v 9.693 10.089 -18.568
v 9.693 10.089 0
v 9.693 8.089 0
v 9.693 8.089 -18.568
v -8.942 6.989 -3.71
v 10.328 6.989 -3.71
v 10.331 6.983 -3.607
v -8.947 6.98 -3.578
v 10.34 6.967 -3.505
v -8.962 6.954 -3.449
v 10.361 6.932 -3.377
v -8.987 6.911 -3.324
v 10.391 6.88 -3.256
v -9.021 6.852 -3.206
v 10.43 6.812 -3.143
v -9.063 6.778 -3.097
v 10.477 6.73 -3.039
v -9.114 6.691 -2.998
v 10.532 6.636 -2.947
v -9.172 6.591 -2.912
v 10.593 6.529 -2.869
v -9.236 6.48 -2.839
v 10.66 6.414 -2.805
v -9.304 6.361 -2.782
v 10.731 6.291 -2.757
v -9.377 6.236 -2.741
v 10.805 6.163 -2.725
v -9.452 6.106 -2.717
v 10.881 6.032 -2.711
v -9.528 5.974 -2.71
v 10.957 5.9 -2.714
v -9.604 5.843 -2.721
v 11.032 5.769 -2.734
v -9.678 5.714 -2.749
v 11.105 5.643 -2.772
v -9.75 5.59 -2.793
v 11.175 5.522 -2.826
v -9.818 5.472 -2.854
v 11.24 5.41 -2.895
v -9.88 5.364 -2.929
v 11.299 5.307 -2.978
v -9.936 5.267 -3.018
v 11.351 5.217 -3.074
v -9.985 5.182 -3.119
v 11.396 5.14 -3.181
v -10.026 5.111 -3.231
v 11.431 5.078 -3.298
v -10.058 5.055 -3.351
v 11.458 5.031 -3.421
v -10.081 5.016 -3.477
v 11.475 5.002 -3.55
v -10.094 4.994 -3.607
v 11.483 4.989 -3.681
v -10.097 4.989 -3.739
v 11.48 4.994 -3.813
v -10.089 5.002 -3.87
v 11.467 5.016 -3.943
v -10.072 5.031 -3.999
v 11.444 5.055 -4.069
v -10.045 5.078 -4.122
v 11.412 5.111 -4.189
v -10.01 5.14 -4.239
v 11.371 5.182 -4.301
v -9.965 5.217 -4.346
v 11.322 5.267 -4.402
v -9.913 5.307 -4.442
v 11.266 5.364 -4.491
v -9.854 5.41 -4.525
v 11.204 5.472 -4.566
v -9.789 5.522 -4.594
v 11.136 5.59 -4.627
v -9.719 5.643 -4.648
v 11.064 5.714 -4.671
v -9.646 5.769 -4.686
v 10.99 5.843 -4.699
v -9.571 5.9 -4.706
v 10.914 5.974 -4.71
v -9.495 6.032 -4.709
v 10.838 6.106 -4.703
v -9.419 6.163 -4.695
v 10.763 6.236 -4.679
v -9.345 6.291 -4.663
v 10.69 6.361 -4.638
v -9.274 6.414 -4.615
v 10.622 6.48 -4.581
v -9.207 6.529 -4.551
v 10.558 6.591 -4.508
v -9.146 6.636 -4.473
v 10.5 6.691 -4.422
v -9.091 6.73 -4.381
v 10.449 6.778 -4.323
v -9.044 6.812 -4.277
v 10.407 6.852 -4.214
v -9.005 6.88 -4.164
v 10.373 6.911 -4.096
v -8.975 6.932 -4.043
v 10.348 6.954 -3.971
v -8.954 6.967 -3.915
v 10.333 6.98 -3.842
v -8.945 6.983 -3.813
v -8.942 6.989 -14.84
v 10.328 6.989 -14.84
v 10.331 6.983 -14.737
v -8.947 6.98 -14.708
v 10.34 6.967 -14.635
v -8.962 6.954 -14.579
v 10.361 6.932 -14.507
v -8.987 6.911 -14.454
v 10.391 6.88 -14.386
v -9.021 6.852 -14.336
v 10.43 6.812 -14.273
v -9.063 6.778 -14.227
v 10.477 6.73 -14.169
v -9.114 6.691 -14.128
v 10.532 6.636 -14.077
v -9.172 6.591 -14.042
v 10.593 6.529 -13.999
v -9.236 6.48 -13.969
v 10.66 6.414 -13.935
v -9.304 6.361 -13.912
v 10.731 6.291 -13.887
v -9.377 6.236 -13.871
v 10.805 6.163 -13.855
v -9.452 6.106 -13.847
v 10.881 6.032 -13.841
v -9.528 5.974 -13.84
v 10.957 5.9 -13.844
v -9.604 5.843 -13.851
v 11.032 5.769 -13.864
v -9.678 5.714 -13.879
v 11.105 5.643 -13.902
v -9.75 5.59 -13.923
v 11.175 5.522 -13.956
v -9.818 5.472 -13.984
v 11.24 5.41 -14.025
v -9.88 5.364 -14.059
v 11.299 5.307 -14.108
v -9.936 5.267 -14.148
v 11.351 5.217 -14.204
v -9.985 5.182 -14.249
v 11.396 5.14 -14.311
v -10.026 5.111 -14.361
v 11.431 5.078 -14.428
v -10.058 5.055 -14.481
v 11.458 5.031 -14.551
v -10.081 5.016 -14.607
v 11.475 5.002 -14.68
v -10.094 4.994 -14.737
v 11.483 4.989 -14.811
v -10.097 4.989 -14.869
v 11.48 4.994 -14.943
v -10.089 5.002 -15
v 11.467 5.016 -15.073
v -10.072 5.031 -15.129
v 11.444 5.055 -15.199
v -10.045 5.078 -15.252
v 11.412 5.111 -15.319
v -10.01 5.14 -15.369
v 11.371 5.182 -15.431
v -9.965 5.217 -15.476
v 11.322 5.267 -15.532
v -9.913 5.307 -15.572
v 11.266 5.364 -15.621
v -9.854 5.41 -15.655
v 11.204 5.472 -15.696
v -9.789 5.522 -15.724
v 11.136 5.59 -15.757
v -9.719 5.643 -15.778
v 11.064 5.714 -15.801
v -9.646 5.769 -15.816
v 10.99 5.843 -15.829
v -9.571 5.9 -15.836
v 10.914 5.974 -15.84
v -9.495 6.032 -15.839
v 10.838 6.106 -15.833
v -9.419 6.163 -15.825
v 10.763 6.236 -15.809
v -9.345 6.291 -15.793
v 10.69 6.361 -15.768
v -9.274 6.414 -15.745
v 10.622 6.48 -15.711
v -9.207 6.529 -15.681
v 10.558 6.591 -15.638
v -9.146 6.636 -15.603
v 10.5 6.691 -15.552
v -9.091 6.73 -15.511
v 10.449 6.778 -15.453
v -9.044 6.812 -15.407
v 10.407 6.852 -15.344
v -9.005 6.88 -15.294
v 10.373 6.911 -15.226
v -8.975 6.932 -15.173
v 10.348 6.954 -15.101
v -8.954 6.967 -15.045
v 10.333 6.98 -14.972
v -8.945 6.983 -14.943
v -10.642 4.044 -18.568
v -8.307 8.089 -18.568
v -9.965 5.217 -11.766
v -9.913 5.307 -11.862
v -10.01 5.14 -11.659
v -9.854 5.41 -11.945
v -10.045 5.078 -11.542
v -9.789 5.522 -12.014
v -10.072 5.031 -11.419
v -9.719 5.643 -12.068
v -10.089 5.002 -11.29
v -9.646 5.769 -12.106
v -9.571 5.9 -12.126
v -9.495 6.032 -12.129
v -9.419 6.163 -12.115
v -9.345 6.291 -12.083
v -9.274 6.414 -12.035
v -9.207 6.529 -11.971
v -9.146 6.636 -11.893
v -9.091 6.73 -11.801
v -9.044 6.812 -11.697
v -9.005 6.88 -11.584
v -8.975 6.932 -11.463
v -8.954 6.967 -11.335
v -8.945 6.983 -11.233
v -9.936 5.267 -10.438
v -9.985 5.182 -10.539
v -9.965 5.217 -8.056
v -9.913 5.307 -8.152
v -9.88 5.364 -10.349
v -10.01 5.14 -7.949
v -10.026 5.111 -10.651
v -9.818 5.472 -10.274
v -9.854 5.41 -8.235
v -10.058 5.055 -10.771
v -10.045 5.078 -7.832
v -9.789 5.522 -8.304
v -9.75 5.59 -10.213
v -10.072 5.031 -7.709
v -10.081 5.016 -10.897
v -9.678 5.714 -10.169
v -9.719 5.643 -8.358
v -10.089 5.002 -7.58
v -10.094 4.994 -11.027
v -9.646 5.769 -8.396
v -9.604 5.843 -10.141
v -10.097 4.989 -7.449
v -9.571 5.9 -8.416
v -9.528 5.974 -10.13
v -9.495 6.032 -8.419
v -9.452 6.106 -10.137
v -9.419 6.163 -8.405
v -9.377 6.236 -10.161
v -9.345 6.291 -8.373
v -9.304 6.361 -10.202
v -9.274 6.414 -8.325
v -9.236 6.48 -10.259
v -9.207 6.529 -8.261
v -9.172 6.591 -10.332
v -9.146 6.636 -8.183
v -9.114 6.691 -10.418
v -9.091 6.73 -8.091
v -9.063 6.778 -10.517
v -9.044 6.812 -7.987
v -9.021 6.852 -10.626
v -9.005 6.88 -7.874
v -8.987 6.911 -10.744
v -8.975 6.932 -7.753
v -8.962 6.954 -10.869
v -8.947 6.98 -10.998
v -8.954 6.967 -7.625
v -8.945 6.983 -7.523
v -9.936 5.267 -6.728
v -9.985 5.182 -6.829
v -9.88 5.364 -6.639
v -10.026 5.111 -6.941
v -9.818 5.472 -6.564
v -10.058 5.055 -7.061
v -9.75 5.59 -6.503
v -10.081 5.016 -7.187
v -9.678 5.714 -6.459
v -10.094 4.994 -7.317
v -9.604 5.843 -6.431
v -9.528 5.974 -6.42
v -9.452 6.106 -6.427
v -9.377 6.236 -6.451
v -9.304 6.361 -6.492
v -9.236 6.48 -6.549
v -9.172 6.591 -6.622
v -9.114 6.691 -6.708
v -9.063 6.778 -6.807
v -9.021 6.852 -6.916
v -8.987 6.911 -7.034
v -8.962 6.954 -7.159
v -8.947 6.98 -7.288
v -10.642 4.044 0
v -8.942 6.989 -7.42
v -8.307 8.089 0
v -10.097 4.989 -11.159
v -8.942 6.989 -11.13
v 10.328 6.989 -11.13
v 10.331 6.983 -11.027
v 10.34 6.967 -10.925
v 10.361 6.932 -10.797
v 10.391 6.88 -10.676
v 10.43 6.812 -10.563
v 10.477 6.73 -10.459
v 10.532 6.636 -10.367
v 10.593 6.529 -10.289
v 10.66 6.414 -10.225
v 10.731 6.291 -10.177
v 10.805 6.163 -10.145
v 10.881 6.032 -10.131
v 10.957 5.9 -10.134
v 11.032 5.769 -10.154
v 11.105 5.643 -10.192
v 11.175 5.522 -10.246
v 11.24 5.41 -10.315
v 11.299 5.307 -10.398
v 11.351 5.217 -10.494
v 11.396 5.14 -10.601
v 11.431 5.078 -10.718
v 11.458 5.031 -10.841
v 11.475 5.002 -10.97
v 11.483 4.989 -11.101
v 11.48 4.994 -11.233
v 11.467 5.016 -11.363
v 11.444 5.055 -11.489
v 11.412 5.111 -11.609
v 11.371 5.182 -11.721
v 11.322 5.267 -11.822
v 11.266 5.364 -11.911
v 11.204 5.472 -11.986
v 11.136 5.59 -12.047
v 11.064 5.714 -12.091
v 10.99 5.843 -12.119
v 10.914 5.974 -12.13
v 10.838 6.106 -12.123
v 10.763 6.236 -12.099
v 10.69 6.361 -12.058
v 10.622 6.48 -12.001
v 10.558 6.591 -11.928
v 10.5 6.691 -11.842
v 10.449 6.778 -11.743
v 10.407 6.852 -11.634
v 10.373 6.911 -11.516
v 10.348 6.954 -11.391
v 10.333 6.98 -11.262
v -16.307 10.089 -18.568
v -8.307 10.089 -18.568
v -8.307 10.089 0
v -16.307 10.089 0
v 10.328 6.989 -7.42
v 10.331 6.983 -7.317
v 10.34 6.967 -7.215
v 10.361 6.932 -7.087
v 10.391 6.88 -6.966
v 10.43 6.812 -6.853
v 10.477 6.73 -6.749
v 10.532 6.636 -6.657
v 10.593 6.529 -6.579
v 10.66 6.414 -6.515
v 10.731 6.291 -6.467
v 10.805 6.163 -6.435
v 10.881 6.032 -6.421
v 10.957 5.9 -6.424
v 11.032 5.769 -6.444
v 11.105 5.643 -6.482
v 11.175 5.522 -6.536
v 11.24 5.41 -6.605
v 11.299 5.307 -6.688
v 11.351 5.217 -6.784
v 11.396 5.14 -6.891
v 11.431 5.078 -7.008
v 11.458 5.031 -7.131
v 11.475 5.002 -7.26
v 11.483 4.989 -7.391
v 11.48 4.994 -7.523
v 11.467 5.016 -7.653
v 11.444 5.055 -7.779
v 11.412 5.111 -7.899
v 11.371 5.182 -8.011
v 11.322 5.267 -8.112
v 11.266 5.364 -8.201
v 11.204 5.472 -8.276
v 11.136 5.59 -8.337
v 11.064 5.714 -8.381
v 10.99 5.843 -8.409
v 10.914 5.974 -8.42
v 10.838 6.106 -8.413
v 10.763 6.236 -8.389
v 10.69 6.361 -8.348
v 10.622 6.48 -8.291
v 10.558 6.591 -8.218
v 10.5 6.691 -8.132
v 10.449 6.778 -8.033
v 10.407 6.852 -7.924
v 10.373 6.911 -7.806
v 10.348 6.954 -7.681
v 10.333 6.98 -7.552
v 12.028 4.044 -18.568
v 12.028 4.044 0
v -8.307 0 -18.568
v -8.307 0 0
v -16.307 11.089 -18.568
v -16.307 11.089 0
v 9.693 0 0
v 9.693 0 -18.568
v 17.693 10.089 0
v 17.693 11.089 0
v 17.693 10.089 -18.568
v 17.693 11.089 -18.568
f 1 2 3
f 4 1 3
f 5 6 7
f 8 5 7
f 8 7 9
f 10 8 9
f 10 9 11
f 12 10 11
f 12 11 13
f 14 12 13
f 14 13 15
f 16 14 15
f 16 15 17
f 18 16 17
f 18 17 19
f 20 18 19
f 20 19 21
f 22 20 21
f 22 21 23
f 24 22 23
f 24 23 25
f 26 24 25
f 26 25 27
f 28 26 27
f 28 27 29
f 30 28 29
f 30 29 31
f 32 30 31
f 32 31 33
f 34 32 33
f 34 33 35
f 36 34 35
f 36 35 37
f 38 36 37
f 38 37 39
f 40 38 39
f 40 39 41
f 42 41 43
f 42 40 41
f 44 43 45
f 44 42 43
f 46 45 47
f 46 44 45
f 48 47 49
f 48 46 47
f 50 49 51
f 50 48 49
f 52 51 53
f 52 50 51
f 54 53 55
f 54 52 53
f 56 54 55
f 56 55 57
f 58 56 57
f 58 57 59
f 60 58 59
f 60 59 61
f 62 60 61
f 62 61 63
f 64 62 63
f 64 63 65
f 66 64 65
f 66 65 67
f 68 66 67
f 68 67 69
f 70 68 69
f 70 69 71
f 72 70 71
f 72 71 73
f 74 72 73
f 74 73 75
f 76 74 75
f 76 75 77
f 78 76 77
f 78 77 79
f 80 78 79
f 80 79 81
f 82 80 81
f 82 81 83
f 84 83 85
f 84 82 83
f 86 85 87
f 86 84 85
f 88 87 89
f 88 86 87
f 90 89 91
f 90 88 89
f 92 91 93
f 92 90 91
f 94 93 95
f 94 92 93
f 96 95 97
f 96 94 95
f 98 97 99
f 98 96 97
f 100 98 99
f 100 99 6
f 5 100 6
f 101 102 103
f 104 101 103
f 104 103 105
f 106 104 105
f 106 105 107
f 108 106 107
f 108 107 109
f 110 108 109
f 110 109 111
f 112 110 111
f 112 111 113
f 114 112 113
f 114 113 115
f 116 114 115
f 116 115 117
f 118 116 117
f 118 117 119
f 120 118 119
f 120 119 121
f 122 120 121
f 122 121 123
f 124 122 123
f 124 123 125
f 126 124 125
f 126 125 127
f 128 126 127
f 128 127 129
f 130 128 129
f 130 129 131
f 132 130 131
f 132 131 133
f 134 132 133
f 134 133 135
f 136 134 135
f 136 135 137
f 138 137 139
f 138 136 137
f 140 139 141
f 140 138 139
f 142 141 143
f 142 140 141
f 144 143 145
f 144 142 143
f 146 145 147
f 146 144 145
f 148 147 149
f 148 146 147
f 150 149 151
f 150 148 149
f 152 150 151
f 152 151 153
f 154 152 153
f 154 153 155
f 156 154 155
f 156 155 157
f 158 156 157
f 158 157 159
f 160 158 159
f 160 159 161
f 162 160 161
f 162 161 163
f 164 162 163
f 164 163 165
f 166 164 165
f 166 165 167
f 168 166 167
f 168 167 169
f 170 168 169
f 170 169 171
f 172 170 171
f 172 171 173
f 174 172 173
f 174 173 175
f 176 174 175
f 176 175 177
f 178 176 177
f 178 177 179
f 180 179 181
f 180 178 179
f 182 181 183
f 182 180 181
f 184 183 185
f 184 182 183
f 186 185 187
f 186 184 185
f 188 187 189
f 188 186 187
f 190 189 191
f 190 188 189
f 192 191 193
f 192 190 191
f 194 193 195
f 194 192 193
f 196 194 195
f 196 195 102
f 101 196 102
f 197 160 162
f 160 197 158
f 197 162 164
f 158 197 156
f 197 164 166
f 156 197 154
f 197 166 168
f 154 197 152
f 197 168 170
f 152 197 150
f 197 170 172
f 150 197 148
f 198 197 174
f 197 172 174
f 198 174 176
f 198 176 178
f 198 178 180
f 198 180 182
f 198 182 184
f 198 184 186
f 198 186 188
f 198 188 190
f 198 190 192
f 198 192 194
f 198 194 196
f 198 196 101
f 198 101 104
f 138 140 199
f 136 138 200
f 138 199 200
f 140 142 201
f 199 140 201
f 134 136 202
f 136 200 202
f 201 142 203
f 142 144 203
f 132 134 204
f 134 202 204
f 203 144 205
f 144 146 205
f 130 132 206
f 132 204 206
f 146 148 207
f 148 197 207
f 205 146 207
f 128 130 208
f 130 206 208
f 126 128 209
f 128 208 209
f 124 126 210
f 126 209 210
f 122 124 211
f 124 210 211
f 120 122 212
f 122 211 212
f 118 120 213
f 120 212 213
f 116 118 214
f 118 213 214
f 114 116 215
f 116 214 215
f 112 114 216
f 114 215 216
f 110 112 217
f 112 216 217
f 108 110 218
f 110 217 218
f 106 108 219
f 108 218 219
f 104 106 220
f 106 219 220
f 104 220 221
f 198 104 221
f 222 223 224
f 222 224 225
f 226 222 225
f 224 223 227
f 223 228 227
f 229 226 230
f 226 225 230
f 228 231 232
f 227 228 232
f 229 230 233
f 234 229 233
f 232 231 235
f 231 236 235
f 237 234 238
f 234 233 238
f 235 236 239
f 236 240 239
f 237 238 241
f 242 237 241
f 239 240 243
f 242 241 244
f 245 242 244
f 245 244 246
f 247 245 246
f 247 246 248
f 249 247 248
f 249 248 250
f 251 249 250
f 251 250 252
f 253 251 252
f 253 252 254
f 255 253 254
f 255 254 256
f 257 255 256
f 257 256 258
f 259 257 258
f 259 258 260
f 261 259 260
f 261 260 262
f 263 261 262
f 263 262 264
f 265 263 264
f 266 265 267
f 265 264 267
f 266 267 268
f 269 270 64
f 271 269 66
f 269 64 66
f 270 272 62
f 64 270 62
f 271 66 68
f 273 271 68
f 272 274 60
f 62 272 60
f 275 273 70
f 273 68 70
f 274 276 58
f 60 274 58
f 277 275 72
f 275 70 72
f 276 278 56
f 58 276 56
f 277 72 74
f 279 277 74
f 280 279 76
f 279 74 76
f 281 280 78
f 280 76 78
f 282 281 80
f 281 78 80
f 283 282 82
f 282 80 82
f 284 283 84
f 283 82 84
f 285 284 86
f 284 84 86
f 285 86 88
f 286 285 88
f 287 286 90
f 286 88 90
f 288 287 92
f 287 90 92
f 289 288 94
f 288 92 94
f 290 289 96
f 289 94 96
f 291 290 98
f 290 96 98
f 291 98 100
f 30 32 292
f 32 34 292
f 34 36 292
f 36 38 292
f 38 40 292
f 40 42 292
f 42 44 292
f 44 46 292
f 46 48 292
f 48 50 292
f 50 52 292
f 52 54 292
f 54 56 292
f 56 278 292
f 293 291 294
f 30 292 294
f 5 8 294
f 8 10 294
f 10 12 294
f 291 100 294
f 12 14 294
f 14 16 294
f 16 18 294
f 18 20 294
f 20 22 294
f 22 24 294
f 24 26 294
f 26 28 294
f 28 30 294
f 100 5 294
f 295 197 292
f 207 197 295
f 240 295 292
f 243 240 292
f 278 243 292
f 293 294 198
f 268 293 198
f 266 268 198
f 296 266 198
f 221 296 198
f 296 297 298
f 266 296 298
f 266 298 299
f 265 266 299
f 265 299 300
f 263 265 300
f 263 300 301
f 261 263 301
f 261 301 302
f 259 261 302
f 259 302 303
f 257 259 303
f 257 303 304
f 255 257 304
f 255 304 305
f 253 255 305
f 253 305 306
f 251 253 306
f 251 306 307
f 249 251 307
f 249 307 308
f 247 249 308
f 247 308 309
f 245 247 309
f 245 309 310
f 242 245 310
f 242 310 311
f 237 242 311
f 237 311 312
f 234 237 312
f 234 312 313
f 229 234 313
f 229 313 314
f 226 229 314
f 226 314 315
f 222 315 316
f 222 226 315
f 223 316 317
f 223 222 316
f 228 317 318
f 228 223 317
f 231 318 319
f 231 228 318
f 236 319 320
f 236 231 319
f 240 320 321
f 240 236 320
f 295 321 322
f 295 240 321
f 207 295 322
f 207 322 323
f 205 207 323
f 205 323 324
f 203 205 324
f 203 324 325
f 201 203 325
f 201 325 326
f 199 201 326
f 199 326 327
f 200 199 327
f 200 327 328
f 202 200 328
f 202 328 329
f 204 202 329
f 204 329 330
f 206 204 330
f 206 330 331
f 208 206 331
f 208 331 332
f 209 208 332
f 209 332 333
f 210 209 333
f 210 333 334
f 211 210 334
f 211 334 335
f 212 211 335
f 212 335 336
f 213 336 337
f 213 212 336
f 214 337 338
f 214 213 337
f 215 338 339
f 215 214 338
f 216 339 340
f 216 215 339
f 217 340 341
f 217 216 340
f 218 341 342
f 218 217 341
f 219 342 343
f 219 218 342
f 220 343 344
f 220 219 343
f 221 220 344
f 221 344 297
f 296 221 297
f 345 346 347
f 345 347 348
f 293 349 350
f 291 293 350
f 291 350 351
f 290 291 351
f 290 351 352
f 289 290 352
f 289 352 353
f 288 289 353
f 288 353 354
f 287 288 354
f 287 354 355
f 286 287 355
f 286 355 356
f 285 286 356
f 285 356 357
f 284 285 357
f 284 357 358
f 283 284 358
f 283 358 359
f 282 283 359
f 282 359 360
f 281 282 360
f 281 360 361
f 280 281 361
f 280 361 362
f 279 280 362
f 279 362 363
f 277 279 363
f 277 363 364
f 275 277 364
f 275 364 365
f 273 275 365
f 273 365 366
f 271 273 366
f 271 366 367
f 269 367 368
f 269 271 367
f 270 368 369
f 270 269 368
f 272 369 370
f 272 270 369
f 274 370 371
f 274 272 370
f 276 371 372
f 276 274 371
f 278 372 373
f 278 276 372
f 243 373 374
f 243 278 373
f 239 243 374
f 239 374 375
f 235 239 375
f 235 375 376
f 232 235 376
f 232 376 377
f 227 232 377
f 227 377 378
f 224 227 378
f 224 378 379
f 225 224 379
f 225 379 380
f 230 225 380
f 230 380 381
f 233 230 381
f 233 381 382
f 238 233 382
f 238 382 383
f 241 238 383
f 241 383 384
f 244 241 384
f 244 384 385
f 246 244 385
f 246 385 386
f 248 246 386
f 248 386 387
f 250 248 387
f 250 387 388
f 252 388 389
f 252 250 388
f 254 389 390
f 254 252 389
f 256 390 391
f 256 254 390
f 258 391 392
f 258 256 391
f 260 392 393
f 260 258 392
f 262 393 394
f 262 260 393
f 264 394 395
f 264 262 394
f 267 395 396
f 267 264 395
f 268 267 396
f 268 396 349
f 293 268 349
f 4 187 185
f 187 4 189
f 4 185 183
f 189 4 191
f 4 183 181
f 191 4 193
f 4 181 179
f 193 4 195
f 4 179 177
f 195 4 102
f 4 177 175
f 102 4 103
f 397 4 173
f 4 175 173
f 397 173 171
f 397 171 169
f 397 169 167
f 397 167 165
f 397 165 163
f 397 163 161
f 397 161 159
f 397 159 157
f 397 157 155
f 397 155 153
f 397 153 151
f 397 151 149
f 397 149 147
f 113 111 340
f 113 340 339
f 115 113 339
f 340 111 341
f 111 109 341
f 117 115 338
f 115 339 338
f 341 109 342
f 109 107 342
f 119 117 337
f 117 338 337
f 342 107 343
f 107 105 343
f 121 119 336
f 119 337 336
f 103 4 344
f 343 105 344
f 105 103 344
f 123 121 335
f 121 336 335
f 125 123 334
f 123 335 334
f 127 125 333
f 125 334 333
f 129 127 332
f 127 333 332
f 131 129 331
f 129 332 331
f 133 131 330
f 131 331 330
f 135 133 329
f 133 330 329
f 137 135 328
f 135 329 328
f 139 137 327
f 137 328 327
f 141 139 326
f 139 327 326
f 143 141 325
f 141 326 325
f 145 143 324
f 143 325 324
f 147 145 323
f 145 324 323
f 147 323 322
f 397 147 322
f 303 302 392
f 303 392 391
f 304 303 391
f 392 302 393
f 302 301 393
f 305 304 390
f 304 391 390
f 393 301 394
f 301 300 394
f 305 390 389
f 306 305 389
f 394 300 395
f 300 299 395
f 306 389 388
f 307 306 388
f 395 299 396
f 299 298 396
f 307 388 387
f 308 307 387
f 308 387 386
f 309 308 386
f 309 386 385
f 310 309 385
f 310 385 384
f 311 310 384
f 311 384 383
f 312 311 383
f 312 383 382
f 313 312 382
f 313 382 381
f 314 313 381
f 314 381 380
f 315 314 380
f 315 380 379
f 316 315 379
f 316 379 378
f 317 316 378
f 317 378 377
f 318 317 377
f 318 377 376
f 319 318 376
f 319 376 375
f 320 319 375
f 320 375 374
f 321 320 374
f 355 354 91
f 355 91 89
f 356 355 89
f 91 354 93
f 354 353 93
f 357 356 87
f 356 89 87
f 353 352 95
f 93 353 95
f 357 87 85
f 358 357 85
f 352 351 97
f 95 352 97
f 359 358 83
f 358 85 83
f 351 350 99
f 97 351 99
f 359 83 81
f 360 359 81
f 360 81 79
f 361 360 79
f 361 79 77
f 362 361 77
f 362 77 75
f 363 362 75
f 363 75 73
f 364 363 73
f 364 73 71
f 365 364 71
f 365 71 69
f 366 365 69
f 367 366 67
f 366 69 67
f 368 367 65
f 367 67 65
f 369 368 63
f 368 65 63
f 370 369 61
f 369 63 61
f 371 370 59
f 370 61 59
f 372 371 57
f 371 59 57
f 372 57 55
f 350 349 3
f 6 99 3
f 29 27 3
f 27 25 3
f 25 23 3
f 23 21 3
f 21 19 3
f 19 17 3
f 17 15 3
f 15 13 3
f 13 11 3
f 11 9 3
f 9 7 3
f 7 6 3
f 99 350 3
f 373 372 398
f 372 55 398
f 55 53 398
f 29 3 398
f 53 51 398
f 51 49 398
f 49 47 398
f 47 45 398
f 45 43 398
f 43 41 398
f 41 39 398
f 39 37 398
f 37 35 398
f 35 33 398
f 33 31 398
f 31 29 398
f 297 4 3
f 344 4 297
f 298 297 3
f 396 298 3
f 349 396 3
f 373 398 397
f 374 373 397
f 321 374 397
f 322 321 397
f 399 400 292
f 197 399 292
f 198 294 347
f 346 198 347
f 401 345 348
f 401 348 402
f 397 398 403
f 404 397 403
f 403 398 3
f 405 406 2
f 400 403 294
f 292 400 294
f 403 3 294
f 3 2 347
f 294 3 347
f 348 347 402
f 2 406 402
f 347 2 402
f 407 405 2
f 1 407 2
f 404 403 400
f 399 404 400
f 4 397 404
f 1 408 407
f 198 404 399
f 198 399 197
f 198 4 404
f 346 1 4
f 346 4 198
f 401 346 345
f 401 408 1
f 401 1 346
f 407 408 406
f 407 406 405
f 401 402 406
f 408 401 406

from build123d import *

# Parameters (mm, degrees)
BOSS_EXTRUDE1_DEPTH     = 18.568445
CUT_EXTRUDE1_DEPTH      = 28.942587158
CUT_EXTRUDE1_DEPTH_BACK = 28.942587158
SKETCH2_R               = 1


with BuildPart() as part:
    # Sketch1 → Boss-Extrude1 (new body)
    with BuildSketch(Plane.XY):
        Polygon((9.693000417, 0), (-8.306999583, 0), (-10.641999583, 4.044338636), (-8.306999583, 8.088677271), (-8.306999583, 10.088677271), (-16.306999583, 10.088677271), (-16.306999583, 11.088677271), (17.693000417, 11.088677271), (17.693000417, 10.088677271), (9.693000417, 10.088677271), (9.693000417, 8.088677271), (12.028000417, 4.044338636), align=None)
    extrude(amount=-BOSS_EXTRUDE1_DEPTH)

    # Sketch2 → Cut-Extrude1 (cut, two sides: drawn at the far end of the back side and taken through both)
    with BuildSketch(Plane(origin=(0, 0, 0), x_dir=(0, 0, -1), z_dir=(1, 0, 0)).offset(-CUT_EXTRUDE1_DEPTH_BACK)):
        with Locations(Location((3.71, 5.988677271, 0), (0, 0, 90))):
            Circle(SKETCH2_R)
        with Locations(Location((7.42, 5.988677271, 0), (0, 0, 90))):
            Circle(SKETCH2_R)
        with Locations(Location((11.13, 5.988677271, 0), (0, 0, 90))):
            Circle(SKETCH2_R)
        with Locations(Location((14.84, 5.988677271, 0), (0, 0, 90))):
            Circle(SKETCH2_R)
    extrude(amount=CUT_EXTRUDE1_DEPTH + CUT_EXTRUDE1_DEPTH_BACK, mode=Mode.SUBTRACT)


solid = part.part
